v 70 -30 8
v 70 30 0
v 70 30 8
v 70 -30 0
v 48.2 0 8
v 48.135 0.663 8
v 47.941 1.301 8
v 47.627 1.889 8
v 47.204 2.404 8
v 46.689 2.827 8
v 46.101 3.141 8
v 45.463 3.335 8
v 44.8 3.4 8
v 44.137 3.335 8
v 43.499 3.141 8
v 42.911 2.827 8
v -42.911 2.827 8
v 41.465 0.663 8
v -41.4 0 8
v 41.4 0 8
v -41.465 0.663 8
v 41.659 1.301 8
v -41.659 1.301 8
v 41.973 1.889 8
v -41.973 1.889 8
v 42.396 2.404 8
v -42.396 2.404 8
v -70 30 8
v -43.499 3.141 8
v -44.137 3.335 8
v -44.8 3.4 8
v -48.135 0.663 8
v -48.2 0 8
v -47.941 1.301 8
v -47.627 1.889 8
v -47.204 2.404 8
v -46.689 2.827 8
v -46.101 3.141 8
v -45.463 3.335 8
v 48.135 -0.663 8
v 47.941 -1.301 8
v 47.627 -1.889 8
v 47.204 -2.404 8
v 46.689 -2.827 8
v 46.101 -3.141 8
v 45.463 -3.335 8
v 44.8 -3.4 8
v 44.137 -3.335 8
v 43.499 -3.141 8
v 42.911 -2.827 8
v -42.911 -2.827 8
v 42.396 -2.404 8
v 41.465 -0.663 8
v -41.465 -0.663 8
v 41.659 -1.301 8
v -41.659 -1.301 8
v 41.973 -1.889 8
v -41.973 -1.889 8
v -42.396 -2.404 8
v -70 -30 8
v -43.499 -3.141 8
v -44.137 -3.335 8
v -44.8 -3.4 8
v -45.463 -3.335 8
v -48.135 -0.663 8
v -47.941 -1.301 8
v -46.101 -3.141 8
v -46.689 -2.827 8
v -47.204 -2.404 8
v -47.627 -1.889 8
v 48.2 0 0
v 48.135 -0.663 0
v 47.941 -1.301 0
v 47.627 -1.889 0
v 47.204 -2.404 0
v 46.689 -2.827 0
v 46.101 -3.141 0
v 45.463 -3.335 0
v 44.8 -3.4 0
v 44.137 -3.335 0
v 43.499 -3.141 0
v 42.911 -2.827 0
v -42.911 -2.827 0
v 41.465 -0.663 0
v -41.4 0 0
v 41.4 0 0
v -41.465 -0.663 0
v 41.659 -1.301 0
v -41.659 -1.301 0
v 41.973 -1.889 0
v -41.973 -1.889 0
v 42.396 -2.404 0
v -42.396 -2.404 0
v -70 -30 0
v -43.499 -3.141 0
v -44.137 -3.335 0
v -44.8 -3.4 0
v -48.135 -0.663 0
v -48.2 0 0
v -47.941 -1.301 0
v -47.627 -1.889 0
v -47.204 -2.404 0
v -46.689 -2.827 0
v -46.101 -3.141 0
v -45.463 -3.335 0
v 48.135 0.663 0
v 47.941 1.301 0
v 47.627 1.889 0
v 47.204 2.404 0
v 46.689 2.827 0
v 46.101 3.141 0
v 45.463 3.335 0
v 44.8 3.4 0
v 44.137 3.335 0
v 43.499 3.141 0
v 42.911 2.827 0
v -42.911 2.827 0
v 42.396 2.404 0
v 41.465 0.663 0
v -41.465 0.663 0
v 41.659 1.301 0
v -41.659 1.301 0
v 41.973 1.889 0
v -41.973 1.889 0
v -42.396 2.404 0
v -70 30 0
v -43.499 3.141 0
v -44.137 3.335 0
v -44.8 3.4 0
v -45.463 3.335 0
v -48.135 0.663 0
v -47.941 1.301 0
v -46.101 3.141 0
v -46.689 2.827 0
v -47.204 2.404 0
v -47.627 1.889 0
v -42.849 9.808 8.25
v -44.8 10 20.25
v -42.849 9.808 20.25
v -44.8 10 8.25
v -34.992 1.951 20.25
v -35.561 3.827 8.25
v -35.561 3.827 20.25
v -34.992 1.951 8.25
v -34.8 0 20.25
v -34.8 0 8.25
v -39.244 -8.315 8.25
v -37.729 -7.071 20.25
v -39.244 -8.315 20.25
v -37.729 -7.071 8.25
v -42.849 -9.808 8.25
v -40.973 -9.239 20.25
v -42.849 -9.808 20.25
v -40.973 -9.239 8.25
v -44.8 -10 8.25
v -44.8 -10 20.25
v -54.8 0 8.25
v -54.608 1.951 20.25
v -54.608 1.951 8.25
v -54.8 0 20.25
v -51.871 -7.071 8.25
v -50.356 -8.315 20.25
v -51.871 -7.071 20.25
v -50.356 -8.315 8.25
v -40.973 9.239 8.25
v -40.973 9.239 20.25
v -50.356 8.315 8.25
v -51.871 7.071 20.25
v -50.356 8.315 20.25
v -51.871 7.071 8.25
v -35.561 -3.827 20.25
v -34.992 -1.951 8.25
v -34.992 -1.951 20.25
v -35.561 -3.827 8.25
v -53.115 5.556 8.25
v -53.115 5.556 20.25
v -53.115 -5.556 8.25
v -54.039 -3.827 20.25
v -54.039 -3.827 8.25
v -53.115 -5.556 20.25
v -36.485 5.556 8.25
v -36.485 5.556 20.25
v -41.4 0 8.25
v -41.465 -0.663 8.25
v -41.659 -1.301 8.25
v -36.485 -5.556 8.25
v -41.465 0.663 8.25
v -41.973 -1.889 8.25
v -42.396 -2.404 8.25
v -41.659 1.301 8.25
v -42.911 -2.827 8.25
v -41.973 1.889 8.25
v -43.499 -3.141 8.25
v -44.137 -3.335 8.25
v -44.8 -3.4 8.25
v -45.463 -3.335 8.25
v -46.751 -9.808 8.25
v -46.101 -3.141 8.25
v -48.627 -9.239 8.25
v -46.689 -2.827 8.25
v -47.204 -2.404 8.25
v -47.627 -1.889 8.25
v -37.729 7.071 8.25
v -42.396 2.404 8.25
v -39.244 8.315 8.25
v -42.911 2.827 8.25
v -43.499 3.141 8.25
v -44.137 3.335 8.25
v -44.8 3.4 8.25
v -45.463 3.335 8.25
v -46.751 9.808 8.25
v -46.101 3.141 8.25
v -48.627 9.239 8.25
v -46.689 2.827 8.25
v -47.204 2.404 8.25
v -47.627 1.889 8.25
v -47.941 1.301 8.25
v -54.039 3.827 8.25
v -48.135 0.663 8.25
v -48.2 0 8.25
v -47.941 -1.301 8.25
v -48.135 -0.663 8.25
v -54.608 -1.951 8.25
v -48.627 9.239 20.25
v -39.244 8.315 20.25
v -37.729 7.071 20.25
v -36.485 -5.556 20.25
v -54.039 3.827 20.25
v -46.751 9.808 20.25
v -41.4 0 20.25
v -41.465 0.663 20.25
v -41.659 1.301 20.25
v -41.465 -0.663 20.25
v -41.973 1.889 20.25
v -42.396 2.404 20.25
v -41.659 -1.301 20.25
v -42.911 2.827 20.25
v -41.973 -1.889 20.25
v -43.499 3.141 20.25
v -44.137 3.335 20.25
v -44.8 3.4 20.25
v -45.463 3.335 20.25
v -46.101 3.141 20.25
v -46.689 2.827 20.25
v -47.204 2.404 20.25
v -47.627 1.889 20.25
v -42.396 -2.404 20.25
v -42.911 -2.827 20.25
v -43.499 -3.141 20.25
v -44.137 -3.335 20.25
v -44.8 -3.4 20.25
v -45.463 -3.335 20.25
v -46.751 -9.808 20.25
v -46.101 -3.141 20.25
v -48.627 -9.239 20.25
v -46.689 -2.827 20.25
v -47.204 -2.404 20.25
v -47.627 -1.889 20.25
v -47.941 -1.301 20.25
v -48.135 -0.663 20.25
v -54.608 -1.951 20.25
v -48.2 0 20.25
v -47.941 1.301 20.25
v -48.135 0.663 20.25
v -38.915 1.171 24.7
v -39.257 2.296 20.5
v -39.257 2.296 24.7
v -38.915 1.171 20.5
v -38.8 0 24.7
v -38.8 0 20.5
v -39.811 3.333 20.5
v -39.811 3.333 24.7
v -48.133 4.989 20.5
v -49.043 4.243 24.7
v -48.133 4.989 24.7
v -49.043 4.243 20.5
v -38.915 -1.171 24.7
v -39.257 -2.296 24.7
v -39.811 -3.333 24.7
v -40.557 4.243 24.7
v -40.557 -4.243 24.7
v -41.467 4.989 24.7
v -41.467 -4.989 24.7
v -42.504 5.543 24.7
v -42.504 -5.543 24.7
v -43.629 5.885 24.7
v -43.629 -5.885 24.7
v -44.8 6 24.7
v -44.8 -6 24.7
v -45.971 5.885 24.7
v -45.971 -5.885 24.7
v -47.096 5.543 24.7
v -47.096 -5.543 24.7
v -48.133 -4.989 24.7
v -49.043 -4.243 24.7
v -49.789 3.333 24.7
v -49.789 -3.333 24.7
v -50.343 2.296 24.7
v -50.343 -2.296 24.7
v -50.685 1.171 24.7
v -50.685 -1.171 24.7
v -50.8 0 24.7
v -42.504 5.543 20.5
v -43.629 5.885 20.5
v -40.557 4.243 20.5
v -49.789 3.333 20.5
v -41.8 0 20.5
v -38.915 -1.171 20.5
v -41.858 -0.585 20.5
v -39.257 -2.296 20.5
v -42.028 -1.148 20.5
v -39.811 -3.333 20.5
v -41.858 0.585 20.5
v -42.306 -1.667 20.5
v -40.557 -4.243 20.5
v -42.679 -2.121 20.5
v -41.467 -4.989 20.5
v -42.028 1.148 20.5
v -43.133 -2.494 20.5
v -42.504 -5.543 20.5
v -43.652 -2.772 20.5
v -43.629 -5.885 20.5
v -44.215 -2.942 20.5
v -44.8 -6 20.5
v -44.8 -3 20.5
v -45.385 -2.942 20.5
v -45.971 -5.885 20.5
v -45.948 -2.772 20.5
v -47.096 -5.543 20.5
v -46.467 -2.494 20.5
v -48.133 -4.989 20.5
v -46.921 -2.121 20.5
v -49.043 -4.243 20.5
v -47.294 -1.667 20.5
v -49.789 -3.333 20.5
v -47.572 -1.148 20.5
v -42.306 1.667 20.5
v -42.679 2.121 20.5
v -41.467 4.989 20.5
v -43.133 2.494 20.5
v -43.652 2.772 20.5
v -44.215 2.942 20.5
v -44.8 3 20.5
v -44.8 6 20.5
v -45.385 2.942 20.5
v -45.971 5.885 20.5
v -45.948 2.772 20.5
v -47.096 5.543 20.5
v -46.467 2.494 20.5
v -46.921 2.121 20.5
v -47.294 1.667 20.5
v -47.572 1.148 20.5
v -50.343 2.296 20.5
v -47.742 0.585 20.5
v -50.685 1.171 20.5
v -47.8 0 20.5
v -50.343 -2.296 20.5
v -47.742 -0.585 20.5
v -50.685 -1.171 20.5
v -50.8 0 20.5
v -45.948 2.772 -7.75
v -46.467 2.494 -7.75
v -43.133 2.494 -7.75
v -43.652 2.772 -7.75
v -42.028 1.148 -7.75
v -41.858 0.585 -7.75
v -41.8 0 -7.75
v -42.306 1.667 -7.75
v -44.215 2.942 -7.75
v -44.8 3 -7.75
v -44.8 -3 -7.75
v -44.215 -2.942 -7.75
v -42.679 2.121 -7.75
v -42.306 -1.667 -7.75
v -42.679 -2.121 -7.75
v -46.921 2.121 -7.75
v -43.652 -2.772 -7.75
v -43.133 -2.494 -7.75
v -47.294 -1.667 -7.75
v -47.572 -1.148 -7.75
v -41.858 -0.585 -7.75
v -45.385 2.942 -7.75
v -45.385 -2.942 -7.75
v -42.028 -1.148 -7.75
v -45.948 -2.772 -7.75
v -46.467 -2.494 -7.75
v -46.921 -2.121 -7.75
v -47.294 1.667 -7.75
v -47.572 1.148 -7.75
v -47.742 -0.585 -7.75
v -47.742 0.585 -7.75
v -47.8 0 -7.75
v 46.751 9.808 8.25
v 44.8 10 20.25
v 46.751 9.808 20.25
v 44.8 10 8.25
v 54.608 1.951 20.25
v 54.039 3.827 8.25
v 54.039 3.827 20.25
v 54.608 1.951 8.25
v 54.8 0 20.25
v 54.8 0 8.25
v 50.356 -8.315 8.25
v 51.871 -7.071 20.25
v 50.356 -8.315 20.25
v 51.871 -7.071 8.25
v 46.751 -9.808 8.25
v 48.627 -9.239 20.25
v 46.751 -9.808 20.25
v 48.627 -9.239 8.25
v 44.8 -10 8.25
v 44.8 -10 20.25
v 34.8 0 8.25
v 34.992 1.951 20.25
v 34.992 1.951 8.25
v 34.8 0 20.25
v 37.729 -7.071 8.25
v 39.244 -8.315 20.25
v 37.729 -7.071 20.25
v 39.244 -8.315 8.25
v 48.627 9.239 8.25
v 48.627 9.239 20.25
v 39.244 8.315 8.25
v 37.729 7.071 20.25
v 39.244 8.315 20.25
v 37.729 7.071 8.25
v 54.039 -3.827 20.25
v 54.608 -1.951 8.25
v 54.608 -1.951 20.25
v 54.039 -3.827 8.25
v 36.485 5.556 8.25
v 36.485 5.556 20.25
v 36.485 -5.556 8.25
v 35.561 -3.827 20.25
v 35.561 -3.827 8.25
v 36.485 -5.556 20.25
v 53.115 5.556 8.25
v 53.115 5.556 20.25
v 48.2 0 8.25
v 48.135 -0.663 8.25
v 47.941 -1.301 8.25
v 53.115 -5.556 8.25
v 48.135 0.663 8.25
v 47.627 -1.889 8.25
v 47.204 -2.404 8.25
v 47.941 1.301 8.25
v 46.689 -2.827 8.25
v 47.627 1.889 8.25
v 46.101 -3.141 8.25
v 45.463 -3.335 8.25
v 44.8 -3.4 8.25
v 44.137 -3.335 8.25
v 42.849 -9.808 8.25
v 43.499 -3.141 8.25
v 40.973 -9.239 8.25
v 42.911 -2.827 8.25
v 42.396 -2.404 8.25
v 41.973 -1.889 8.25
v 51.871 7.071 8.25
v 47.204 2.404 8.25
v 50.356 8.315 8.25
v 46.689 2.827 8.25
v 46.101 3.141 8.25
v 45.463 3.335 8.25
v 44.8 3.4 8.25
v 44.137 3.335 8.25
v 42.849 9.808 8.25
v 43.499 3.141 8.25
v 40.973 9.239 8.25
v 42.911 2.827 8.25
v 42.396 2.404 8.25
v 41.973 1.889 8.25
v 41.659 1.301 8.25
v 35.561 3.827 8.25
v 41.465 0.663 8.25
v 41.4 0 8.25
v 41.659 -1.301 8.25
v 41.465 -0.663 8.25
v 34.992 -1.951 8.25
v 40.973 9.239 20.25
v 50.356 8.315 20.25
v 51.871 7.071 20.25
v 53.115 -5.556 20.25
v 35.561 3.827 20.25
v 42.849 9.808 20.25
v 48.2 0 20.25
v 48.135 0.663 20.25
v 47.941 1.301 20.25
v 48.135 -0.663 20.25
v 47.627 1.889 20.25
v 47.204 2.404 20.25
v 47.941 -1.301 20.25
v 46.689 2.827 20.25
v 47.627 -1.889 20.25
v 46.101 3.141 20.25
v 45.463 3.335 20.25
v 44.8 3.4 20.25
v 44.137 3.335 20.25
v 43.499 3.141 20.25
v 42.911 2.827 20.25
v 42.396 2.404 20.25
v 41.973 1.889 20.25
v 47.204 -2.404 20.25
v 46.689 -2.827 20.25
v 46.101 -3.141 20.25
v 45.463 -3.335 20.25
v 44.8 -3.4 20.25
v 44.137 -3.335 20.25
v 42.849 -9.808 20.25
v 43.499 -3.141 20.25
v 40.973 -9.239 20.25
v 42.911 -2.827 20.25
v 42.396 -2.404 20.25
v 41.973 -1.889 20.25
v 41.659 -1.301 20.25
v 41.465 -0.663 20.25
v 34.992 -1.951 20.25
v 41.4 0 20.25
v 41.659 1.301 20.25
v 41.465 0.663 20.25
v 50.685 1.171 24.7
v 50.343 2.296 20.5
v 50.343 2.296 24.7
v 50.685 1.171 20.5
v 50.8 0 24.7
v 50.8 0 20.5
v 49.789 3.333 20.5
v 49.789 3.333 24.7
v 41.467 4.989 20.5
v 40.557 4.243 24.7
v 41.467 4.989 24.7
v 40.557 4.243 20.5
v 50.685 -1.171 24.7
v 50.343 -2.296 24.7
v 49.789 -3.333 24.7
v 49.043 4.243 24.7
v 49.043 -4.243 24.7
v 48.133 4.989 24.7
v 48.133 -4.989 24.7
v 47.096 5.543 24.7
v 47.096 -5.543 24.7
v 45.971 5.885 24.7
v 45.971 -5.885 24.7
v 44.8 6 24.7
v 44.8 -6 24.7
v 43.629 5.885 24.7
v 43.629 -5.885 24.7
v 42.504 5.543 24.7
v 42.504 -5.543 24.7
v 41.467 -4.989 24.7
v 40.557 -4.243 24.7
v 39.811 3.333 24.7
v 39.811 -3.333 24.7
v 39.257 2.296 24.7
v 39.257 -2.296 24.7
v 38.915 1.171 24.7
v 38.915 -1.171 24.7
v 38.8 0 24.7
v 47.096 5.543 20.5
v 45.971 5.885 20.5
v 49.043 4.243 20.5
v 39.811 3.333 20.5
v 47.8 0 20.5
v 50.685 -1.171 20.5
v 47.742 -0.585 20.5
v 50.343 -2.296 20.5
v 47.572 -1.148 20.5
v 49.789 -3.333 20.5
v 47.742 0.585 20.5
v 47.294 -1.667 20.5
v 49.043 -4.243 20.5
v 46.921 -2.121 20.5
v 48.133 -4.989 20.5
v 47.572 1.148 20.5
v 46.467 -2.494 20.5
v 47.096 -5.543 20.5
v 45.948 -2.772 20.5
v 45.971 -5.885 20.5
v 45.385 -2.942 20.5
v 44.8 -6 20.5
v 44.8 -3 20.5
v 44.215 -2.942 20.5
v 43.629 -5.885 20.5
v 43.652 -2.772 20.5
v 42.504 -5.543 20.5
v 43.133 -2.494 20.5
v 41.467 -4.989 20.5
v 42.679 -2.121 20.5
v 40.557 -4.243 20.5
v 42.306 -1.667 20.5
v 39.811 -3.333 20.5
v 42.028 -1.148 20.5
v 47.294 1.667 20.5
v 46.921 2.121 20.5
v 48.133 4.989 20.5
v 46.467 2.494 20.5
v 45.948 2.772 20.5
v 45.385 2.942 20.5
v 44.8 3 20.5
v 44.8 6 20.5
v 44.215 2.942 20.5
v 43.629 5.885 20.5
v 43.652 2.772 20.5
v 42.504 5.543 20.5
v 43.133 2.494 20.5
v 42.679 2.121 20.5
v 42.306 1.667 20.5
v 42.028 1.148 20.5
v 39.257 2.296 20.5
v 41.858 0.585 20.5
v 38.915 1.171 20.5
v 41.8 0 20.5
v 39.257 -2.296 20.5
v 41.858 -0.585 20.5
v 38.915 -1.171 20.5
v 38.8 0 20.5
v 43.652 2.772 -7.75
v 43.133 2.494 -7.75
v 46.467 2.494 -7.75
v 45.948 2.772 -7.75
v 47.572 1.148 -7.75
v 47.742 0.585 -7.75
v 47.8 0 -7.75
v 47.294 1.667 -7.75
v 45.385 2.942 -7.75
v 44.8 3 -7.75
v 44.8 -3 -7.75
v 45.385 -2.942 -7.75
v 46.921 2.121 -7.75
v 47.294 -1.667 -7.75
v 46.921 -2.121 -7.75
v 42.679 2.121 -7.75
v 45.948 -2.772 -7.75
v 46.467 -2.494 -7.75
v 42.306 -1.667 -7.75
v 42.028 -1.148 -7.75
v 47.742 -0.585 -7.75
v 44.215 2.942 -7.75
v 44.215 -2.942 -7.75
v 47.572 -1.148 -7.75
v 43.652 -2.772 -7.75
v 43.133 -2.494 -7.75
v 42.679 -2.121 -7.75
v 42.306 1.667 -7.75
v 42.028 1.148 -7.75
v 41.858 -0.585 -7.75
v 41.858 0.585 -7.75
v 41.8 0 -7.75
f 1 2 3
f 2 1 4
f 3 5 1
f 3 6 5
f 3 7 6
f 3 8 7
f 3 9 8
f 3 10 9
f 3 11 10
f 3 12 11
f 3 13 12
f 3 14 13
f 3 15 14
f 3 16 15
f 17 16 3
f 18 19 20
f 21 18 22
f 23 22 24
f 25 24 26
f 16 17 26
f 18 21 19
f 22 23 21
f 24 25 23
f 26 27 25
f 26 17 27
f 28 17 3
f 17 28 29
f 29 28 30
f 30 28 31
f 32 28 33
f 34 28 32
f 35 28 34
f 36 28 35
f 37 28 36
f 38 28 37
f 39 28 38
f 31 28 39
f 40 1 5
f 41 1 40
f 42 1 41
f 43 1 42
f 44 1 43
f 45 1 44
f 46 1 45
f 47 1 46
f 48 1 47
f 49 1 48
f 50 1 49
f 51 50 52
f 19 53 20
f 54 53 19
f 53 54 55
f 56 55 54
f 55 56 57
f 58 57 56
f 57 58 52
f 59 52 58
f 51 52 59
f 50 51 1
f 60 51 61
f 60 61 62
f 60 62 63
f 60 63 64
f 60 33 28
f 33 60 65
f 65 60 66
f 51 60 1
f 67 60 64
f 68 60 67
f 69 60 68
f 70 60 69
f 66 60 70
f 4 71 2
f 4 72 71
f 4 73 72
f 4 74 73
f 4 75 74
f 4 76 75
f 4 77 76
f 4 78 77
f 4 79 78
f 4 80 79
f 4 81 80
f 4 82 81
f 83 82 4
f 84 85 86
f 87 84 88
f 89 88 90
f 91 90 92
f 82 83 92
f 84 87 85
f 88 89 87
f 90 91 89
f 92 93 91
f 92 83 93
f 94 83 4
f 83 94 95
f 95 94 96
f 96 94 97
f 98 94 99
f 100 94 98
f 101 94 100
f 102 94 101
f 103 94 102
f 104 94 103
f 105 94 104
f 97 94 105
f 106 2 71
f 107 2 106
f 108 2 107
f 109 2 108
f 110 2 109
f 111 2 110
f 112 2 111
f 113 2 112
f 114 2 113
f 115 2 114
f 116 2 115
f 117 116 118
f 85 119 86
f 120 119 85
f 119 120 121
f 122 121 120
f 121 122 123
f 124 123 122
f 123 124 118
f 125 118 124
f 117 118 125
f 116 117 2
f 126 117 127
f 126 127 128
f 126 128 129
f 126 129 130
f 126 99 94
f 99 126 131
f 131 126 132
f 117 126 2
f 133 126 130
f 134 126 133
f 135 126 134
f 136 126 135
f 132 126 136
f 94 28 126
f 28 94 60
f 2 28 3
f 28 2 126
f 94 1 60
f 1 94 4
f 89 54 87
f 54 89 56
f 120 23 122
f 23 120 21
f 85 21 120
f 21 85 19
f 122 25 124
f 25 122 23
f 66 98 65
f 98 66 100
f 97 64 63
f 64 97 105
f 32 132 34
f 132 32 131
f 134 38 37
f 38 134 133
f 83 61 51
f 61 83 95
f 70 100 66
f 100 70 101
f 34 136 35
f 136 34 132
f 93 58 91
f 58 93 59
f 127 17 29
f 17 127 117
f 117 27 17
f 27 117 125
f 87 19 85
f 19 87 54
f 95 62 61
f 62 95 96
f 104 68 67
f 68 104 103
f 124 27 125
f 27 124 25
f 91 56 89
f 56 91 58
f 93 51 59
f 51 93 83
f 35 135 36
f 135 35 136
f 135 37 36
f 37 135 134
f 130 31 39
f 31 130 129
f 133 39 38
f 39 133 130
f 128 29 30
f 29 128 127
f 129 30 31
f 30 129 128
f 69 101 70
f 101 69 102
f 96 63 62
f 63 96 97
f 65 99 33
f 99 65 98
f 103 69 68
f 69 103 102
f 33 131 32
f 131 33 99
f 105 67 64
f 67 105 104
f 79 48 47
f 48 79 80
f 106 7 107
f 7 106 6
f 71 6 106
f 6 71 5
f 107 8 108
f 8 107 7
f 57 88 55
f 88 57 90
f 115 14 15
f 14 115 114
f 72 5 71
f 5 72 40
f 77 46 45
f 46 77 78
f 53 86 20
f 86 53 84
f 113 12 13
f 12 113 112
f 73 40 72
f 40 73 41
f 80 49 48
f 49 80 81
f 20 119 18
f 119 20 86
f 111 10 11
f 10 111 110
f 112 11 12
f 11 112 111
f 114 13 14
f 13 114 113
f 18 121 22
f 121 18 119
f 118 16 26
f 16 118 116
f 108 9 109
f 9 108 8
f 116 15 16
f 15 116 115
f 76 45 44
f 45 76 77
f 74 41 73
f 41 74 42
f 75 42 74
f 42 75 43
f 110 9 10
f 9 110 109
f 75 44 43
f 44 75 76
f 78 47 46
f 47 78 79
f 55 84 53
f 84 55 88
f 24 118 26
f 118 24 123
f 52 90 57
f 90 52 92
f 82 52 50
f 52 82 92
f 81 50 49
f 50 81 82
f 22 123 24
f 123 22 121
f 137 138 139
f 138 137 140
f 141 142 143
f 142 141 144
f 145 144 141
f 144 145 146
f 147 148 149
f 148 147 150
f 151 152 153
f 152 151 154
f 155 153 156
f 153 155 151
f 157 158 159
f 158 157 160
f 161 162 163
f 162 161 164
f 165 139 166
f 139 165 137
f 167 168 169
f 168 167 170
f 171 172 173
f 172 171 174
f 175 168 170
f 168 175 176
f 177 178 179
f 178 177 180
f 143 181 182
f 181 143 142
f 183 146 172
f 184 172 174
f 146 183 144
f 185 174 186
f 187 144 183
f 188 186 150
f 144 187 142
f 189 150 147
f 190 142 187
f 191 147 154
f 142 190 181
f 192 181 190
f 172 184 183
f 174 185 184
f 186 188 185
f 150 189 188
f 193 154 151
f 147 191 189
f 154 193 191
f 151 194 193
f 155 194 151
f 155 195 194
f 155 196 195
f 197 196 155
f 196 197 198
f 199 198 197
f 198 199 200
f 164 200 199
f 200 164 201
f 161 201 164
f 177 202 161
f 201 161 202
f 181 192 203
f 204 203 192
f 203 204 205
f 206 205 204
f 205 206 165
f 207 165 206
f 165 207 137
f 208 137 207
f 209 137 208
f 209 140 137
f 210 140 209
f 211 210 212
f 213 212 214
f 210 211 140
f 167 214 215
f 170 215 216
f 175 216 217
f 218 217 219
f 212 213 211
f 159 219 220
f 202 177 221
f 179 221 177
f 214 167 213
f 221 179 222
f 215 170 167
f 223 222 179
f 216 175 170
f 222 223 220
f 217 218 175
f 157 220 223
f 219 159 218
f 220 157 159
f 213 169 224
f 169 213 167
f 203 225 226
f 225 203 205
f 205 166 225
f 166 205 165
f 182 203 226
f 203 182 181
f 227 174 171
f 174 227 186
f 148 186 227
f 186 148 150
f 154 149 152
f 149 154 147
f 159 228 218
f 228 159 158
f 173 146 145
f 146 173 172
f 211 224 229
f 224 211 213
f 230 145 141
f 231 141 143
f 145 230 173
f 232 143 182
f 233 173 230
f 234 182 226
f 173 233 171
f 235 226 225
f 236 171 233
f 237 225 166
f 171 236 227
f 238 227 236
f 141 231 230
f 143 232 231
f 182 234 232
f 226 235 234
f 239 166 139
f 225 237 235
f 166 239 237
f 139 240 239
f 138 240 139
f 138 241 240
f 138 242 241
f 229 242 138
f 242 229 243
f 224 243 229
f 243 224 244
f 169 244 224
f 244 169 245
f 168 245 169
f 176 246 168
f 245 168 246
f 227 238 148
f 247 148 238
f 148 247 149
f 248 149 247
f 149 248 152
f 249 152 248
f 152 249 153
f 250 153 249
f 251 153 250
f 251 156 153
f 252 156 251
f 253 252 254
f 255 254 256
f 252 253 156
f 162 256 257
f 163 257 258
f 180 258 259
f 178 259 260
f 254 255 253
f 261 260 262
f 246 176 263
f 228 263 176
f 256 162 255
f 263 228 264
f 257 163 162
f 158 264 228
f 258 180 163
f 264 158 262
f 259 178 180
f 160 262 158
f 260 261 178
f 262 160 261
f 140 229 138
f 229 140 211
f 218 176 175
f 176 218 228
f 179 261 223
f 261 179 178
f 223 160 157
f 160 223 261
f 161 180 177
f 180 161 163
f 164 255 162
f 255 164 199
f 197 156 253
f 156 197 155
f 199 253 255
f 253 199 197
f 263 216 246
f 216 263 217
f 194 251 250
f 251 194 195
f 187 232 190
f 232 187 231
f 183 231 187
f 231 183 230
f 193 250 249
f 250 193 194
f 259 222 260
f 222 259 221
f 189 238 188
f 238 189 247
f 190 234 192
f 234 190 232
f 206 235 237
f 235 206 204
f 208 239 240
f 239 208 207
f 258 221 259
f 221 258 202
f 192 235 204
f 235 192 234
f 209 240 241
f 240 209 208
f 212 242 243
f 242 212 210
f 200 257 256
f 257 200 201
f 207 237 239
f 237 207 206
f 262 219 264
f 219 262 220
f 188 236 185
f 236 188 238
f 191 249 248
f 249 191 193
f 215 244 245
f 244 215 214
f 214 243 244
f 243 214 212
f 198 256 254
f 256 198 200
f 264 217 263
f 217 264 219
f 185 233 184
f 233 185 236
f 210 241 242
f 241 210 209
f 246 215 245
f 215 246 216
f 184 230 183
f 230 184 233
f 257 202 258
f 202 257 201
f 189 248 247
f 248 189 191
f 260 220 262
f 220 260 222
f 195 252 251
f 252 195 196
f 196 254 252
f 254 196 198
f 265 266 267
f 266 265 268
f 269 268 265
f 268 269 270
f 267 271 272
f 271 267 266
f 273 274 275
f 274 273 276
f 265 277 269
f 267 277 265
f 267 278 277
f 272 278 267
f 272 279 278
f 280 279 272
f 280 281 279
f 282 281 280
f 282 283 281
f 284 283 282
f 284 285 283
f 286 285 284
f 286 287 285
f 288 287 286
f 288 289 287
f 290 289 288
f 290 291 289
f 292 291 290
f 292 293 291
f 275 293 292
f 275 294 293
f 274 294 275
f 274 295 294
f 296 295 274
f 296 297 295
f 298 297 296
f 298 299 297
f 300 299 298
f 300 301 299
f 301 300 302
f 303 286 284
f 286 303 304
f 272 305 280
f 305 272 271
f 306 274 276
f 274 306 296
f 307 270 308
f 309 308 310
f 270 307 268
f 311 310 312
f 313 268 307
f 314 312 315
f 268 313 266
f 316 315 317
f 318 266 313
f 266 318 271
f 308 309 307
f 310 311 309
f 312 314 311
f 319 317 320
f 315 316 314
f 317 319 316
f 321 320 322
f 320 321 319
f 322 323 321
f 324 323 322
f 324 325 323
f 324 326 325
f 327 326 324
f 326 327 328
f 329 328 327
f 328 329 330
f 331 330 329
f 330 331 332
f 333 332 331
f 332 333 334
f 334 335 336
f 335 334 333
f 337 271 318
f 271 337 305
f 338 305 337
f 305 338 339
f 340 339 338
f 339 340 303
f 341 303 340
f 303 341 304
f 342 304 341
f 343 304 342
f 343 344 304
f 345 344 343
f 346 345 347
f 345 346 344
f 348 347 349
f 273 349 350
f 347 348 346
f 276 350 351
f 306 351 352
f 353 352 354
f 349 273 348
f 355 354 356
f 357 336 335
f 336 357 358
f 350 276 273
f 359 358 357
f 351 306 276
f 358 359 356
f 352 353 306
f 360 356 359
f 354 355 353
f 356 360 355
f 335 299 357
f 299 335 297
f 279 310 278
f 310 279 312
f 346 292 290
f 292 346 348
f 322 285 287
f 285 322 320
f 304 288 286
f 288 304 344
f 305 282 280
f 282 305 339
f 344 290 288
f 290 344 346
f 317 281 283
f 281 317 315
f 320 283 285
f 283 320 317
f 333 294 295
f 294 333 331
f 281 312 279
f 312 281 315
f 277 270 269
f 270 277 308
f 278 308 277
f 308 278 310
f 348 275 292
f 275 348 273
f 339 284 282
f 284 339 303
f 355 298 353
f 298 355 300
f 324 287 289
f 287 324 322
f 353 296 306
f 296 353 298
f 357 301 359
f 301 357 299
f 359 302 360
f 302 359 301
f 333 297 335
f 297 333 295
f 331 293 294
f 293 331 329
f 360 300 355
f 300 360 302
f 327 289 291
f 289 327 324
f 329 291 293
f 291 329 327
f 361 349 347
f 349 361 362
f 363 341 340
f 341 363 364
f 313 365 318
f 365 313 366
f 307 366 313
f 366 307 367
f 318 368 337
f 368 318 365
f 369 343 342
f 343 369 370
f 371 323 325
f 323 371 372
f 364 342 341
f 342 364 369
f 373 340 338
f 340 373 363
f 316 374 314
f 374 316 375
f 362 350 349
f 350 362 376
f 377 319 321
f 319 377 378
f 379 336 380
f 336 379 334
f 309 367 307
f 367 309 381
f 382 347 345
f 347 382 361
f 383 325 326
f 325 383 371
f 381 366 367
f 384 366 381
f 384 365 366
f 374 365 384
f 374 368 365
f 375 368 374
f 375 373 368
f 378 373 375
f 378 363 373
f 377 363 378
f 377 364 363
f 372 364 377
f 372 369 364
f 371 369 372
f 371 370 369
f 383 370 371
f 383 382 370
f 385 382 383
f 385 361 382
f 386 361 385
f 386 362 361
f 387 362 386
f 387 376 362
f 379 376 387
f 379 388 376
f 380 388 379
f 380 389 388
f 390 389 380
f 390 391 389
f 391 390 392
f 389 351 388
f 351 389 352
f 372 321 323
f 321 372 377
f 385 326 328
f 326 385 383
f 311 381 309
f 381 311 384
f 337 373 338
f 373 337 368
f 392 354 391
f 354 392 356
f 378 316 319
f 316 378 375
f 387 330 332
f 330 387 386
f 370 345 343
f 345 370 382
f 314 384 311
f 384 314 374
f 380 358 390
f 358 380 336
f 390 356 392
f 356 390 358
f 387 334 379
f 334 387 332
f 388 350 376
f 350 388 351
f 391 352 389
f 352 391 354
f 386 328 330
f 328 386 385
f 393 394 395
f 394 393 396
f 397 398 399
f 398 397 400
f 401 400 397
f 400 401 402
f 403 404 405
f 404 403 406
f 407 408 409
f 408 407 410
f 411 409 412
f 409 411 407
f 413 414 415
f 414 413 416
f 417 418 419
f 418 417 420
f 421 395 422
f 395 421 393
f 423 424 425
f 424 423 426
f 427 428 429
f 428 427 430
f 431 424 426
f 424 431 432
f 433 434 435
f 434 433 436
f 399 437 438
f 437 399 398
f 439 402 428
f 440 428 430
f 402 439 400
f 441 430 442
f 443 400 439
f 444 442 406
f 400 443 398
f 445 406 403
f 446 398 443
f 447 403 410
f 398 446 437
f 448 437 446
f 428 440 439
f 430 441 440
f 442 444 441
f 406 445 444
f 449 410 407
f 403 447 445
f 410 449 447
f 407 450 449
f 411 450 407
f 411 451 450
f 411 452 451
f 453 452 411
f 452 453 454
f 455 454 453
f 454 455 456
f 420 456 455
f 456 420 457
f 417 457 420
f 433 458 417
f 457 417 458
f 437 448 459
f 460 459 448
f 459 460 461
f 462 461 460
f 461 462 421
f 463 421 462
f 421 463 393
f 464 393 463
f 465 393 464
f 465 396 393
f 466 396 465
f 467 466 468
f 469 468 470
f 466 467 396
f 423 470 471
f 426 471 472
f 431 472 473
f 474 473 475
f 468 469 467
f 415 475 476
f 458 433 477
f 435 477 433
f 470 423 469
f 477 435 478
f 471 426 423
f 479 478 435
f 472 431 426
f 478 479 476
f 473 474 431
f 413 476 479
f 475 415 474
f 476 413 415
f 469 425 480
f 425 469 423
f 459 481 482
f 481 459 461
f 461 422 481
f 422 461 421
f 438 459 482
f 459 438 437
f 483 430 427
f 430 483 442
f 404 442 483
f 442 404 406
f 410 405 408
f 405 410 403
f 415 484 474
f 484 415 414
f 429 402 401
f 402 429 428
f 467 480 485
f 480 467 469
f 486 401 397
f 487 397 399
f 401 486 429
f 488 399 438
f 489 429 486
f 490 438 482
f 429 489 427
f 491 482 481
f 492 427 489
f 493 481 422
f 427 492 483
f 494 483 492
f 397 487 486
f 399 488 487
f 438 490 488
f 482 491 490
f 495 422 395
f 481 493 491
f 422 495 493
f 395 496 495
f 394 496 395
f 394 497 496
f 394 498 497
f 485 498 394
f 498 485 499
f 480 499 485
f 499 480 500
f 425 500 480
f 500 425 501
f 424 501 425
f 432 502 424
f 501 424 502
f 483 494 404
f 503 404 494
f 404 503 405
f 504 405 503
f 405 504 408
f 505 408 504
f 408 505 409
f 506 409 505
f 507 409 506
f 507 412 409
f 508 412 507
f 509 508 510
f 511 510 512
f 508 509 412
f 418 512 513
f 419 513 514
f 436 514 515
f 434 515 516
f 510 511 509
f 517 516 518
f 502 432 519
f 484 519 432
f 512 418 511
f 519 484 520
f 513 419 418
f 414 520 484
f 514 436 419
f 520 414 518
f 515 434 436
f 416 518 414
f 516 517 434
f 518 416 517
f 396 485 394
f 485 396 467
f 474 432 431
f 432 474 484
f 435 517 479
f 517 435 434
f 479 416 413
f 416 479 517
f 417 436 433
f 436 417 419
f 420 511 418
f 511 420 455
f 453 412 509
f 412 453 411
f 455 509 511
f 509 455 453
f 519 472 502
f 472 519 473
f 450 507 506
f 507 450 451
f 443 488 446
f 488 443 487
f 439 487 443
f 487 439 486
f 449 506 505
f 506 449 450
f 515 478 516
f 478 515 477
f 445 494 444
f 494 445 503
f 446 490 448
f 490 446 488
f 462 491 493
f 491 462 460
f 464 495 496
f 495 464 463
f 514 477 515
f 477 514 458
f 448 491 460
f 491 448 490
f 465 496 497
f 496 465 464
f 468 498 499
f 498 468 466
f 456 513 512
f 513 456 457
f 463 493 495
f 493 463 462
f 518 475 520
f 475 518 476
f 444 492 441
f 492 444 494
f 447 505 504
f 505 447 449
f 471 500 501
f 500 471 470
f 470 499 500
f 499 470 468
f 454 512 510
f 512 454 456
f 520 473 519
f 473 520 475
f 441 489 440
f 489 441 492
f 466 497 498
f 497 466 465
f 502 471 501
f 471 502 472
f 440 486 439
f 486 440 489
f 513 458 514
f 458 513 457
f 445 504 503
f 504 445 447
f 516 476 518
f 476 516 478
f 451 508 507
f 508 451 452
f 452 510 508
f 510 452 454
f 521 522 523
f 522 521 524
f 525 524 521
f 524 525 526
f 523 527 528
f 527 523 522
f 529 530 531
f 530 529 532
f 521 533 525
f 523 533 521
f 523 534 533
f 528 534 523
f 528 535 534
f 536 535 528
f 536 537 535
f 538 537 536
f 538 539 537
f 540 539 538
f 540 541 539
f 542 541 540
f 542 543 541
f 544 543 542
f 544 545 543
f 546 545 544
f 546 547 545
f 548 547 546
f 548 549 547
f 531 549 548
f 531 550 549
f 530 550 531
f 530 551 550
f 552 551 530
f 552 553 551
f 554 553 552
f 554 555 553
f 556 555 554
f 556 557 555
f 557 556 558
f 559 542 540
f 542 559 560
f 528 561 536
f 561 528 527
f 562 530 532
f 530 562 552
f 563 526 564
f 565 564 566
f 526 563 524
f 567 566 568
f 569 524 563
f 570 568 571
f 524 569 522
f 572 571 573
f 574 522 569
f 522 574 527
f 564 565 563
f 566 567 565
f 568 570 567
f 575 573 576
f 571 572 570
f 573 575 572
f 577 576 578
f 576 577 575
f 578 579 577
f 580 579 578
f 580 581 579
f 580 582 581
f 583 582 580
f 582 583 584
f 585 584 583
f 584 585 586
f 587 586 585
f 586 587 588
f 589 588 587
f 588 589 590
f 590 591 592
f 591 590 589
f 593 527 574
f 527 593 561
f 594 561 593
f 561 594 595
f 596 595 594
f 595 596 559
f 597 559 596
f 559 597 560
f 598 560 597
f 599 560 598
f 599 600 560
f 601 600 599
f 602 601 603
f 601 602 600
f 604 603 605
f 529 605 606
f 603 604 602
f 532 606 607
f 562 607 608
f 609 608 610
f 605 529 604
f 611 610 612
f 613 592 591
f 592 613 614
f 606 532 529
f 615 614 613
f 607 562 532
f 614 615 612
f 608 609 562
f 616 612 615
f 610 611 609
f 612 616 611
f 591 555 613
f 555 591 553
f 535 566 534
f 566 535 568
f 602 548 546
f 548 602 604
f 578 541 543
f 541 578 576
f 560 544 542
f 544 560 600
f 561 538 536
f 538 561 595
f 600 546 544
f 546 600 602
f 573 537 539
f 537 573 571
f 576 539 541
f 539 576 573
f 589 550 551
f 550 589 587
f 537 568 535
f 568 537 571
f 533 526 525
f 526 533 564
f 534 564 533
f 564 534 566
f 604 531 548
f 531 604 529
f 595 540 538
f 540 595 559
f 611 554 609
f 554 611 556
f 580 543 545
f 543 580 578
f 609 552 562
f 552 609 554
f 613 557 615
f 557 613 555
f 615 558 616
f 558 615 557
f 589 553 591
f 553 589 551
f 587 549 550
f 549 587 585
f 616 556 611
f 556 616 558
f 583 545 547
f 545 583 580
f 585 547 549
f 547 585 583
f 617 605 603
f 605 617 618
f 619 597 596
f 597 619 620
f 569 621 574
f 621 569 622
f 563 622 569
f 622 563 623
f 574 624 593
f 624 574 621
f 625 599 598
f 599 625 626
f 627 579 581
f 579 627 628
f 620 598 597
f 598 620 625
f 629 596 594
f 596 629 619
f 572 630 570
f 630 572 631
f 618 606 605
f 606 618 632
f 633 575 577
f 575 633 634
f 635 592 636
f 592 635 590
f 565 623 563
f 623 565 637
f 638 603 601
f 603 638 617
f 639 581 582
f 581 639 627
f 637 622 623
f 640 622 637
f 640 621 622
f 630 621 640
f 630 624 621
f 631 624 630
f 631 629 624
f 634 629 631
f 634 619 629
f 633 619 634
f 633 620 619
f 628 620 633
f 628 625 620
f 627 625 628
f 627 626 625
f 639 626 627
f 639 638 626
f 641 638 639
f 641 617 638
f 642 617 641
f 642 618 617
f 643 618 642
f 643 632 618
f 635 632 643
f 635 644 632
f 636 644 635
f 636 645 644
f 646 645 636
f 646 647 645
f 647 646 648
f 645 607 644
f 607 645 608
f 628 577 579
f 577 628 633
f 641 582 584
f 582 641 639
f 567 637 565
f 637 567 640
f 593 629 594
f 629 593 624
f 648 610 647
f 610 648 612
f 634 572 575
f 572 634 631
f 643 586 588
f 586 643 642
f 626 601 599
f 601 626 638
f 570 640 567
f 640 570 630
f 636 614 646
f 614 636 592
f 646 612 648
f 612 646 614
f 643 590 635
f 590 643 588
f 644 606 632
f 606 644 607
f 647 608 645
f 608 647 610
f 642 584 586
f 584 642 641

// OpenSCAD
$fn = 32;

// ------------------------------------------------------------------------
// Standoff columns: 2 d20 standoffs, bolts d6
// Every part is its own module, assembly() places them once.
// ------------------------------------------------------------------------

// --- part 1 ---
module base_plate() {
  difference() {
    translate([-70, -30, 0]) cube([140, 60, 8]);
    translate([-44.8, 0, -1]) cylinder(h = 10, d = 6.8);
    translate([44.8, 0, -1]) cylinder(h = 10, d = 6.8);
  }
}

// --- part 2 ---
module spacer1() {
  difference() {
      translate([0, 0, 0]) cylinder(h = 12, d = 20);
      translate([0, 0, -1]) cylinder(h = 14, d = 6.8);
    }
}

// --- part 3 ---
module bolt1() {
  cylinder(h = 4.2, d = 12);
  translate([0, 0, -28.25]) cylinder(h = 28.25, d = 6);
}

// --- part 4 ---
module spacer2() {
  difference() {
      translate([0, 0, 0]) cylinder(h = 12, d = 20);
      translate([0, 0, -1]) cylinder(h = 14, d = 6.8);
    }
}

// --- part 5 ---
module bolt2() {
  cylinder(h = 4.2, d = 12);
  translate([0, 0, -28.25]) cylinder(h = 28.25, d = 6);
}

// --- assembly ---
module assembly() {
  translate([0, 0, 0]) rotate([0, 0, 0]) base_plate();
  translate([-44.8, 0, 8.25]) rotate([0, 0, 0]) spacer1();
  translate([-44.8, 0, 20.5]) rotate([0, 0, 0]) bolt1();
  translate([44.8, 0, 8.25]) rotate([0, 0, 0]) spacer2();
  translate([44.8, 0, 20.5]) rotate([0, 0, 0]) bolt2();
}

assembly();
